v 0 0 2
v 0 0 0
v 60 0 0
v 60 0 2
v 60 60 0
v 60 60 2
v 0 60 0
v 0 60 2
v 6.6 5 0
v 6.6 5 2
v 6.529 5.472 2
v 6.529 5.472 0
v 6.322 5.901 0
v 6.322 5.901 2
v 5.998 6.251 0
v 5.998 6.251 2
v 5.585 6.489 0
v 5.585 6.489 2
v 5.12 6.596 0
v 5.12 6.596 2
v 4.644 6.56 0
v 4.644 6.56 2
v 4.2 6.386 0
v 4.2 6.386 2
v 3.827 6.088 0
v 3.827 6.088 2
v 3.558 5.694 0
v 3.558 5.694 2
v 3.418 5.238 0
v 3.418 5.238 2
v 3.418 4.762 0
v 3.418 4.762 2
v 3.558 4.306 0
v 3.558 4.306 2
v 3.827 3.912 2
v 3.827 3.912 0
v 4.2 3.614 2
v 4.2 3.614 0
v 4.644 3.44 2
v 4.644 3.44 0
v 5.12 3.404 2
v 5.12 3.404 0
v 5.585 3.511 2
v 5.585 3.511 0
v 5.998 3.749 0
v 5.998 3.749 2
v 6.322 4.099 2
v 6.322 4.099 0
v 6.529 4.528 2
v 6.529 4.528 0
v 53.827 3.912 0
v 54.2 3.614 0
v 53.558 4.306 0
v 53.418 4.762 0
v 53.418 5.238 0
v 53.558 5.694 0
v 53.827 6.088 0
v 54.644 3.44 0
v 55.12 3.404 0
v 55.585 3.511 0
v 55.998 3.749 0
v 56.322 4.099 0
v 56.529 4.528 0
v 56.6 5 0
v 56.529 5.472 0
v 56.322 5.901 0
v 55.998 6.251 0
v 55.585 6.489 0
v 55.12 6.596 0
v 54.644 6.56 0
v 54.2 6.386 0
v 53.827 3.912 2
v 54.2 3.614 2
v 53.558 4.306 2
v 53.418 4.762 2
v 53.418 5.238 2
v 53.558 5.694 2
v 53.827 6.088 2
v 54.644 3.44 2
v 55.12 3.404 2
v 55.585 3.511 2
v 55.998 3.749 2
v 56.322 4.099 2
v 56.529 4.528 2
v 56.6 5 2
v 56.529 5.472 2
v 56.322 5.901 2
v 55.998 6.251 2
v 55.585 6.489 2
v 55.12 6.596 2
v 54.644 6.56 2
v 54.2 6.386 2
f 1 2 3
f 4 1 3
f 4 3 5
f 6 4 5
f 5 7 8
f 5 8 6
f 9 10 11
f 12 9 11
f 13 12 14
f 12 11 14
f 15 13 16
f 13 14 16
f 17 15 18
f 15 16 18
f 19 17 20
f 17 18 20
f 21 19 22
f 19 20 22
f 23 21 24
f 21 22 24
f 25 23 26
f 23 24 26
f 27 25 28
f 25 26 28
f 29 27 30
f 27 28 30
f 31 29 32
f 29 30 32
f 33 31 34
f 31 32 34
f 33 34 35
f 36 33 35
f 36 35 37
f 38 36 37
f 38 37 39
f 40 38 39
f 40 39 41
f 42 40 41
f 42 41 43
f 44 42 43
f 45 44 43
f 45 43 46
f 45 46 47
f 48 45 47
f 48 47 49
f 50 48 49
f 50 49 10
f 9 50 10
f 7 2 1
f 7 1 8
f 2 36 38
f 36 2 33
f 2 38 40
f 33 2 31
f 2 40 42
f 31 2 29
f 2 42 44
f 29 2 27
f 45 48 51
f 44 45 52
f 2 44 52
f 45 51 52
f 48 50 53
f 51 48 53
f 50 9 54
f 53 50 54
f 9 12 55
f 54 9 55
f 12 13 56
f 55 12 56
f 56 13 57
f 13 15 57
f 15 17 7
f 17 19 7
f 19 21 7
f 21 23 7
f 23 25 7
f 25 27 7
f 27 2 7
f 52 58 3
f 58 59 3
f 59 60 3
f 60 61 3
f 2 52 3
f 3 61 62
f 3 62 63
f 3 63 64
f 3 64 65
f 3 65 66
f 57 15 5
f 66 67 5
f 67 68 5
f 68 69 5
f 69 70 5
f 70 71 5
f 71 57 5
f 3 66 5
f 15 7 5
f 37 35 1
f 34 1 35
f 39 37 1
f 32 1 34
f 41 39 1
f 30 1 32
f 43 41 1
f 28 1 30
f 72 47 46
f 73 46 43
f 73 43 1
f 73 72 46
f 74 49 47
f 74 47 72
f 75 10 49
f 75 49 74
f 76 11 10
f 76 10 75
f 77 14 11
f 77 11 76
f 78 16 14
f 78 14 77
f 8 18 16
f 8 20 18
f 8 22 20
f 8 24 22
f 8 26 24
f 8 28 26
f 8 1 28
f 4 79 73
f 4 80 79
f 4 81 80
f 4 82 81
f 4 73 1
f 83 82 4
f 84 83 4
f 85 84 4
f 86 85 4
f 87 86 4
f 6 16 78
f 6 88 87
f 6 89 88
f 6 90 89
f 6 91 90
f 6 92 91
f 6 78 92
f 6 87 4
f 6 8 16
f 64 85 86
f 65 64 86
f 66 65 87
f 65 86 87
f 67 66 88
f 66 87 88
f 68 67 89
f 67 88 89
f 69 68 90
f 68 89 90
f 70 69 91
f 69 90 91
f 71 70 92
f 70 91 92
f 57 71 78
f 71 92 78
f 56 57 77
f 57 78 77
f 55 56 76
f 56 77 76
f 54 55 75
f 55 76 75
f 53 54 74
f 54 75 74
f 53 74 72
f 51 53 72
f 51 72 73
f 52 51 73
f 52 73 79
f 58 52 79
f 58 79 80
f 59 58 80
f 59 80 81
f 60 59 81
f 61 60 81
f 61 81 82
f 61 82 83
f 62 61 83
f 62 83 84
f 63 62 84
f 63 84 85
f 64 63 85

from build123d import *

# Parameters (mm, degrees)
SKETCH1_W                = 60
SKETCH1_H                = 60
BOSS_EXTRUDE1_DEPTH      = 2
M3_CLEARANCE_HOLE1_D     = 3.2
M3_CLEARANCE_HOLE1_DEPTH = 2


with BuildPart() as part:
    # Sketch1 → Boss-Extrude1 (new body)
    with BuildSketch(Plane.XY):
        with Locations((30, 30)):
            Rectangle(SKETCH1_W, SKETCH1_H)
    extrude(amount=BOSS_EXTRUDE1_DEPTH)

    # M3 Clearance Hole1
    with Locations(Plane(origin=(0, 0, 0), x_dir=(-1, 0, 0), z_dir=(0, 0, -1))):
        with Locations((-55, 5), (-5, 5)):
            Hole(M3_CLEARANCE_HOLE1_D / 2, depth=M3_CLEARANCE_HOLE1_DEPTH)


solid = part.part
